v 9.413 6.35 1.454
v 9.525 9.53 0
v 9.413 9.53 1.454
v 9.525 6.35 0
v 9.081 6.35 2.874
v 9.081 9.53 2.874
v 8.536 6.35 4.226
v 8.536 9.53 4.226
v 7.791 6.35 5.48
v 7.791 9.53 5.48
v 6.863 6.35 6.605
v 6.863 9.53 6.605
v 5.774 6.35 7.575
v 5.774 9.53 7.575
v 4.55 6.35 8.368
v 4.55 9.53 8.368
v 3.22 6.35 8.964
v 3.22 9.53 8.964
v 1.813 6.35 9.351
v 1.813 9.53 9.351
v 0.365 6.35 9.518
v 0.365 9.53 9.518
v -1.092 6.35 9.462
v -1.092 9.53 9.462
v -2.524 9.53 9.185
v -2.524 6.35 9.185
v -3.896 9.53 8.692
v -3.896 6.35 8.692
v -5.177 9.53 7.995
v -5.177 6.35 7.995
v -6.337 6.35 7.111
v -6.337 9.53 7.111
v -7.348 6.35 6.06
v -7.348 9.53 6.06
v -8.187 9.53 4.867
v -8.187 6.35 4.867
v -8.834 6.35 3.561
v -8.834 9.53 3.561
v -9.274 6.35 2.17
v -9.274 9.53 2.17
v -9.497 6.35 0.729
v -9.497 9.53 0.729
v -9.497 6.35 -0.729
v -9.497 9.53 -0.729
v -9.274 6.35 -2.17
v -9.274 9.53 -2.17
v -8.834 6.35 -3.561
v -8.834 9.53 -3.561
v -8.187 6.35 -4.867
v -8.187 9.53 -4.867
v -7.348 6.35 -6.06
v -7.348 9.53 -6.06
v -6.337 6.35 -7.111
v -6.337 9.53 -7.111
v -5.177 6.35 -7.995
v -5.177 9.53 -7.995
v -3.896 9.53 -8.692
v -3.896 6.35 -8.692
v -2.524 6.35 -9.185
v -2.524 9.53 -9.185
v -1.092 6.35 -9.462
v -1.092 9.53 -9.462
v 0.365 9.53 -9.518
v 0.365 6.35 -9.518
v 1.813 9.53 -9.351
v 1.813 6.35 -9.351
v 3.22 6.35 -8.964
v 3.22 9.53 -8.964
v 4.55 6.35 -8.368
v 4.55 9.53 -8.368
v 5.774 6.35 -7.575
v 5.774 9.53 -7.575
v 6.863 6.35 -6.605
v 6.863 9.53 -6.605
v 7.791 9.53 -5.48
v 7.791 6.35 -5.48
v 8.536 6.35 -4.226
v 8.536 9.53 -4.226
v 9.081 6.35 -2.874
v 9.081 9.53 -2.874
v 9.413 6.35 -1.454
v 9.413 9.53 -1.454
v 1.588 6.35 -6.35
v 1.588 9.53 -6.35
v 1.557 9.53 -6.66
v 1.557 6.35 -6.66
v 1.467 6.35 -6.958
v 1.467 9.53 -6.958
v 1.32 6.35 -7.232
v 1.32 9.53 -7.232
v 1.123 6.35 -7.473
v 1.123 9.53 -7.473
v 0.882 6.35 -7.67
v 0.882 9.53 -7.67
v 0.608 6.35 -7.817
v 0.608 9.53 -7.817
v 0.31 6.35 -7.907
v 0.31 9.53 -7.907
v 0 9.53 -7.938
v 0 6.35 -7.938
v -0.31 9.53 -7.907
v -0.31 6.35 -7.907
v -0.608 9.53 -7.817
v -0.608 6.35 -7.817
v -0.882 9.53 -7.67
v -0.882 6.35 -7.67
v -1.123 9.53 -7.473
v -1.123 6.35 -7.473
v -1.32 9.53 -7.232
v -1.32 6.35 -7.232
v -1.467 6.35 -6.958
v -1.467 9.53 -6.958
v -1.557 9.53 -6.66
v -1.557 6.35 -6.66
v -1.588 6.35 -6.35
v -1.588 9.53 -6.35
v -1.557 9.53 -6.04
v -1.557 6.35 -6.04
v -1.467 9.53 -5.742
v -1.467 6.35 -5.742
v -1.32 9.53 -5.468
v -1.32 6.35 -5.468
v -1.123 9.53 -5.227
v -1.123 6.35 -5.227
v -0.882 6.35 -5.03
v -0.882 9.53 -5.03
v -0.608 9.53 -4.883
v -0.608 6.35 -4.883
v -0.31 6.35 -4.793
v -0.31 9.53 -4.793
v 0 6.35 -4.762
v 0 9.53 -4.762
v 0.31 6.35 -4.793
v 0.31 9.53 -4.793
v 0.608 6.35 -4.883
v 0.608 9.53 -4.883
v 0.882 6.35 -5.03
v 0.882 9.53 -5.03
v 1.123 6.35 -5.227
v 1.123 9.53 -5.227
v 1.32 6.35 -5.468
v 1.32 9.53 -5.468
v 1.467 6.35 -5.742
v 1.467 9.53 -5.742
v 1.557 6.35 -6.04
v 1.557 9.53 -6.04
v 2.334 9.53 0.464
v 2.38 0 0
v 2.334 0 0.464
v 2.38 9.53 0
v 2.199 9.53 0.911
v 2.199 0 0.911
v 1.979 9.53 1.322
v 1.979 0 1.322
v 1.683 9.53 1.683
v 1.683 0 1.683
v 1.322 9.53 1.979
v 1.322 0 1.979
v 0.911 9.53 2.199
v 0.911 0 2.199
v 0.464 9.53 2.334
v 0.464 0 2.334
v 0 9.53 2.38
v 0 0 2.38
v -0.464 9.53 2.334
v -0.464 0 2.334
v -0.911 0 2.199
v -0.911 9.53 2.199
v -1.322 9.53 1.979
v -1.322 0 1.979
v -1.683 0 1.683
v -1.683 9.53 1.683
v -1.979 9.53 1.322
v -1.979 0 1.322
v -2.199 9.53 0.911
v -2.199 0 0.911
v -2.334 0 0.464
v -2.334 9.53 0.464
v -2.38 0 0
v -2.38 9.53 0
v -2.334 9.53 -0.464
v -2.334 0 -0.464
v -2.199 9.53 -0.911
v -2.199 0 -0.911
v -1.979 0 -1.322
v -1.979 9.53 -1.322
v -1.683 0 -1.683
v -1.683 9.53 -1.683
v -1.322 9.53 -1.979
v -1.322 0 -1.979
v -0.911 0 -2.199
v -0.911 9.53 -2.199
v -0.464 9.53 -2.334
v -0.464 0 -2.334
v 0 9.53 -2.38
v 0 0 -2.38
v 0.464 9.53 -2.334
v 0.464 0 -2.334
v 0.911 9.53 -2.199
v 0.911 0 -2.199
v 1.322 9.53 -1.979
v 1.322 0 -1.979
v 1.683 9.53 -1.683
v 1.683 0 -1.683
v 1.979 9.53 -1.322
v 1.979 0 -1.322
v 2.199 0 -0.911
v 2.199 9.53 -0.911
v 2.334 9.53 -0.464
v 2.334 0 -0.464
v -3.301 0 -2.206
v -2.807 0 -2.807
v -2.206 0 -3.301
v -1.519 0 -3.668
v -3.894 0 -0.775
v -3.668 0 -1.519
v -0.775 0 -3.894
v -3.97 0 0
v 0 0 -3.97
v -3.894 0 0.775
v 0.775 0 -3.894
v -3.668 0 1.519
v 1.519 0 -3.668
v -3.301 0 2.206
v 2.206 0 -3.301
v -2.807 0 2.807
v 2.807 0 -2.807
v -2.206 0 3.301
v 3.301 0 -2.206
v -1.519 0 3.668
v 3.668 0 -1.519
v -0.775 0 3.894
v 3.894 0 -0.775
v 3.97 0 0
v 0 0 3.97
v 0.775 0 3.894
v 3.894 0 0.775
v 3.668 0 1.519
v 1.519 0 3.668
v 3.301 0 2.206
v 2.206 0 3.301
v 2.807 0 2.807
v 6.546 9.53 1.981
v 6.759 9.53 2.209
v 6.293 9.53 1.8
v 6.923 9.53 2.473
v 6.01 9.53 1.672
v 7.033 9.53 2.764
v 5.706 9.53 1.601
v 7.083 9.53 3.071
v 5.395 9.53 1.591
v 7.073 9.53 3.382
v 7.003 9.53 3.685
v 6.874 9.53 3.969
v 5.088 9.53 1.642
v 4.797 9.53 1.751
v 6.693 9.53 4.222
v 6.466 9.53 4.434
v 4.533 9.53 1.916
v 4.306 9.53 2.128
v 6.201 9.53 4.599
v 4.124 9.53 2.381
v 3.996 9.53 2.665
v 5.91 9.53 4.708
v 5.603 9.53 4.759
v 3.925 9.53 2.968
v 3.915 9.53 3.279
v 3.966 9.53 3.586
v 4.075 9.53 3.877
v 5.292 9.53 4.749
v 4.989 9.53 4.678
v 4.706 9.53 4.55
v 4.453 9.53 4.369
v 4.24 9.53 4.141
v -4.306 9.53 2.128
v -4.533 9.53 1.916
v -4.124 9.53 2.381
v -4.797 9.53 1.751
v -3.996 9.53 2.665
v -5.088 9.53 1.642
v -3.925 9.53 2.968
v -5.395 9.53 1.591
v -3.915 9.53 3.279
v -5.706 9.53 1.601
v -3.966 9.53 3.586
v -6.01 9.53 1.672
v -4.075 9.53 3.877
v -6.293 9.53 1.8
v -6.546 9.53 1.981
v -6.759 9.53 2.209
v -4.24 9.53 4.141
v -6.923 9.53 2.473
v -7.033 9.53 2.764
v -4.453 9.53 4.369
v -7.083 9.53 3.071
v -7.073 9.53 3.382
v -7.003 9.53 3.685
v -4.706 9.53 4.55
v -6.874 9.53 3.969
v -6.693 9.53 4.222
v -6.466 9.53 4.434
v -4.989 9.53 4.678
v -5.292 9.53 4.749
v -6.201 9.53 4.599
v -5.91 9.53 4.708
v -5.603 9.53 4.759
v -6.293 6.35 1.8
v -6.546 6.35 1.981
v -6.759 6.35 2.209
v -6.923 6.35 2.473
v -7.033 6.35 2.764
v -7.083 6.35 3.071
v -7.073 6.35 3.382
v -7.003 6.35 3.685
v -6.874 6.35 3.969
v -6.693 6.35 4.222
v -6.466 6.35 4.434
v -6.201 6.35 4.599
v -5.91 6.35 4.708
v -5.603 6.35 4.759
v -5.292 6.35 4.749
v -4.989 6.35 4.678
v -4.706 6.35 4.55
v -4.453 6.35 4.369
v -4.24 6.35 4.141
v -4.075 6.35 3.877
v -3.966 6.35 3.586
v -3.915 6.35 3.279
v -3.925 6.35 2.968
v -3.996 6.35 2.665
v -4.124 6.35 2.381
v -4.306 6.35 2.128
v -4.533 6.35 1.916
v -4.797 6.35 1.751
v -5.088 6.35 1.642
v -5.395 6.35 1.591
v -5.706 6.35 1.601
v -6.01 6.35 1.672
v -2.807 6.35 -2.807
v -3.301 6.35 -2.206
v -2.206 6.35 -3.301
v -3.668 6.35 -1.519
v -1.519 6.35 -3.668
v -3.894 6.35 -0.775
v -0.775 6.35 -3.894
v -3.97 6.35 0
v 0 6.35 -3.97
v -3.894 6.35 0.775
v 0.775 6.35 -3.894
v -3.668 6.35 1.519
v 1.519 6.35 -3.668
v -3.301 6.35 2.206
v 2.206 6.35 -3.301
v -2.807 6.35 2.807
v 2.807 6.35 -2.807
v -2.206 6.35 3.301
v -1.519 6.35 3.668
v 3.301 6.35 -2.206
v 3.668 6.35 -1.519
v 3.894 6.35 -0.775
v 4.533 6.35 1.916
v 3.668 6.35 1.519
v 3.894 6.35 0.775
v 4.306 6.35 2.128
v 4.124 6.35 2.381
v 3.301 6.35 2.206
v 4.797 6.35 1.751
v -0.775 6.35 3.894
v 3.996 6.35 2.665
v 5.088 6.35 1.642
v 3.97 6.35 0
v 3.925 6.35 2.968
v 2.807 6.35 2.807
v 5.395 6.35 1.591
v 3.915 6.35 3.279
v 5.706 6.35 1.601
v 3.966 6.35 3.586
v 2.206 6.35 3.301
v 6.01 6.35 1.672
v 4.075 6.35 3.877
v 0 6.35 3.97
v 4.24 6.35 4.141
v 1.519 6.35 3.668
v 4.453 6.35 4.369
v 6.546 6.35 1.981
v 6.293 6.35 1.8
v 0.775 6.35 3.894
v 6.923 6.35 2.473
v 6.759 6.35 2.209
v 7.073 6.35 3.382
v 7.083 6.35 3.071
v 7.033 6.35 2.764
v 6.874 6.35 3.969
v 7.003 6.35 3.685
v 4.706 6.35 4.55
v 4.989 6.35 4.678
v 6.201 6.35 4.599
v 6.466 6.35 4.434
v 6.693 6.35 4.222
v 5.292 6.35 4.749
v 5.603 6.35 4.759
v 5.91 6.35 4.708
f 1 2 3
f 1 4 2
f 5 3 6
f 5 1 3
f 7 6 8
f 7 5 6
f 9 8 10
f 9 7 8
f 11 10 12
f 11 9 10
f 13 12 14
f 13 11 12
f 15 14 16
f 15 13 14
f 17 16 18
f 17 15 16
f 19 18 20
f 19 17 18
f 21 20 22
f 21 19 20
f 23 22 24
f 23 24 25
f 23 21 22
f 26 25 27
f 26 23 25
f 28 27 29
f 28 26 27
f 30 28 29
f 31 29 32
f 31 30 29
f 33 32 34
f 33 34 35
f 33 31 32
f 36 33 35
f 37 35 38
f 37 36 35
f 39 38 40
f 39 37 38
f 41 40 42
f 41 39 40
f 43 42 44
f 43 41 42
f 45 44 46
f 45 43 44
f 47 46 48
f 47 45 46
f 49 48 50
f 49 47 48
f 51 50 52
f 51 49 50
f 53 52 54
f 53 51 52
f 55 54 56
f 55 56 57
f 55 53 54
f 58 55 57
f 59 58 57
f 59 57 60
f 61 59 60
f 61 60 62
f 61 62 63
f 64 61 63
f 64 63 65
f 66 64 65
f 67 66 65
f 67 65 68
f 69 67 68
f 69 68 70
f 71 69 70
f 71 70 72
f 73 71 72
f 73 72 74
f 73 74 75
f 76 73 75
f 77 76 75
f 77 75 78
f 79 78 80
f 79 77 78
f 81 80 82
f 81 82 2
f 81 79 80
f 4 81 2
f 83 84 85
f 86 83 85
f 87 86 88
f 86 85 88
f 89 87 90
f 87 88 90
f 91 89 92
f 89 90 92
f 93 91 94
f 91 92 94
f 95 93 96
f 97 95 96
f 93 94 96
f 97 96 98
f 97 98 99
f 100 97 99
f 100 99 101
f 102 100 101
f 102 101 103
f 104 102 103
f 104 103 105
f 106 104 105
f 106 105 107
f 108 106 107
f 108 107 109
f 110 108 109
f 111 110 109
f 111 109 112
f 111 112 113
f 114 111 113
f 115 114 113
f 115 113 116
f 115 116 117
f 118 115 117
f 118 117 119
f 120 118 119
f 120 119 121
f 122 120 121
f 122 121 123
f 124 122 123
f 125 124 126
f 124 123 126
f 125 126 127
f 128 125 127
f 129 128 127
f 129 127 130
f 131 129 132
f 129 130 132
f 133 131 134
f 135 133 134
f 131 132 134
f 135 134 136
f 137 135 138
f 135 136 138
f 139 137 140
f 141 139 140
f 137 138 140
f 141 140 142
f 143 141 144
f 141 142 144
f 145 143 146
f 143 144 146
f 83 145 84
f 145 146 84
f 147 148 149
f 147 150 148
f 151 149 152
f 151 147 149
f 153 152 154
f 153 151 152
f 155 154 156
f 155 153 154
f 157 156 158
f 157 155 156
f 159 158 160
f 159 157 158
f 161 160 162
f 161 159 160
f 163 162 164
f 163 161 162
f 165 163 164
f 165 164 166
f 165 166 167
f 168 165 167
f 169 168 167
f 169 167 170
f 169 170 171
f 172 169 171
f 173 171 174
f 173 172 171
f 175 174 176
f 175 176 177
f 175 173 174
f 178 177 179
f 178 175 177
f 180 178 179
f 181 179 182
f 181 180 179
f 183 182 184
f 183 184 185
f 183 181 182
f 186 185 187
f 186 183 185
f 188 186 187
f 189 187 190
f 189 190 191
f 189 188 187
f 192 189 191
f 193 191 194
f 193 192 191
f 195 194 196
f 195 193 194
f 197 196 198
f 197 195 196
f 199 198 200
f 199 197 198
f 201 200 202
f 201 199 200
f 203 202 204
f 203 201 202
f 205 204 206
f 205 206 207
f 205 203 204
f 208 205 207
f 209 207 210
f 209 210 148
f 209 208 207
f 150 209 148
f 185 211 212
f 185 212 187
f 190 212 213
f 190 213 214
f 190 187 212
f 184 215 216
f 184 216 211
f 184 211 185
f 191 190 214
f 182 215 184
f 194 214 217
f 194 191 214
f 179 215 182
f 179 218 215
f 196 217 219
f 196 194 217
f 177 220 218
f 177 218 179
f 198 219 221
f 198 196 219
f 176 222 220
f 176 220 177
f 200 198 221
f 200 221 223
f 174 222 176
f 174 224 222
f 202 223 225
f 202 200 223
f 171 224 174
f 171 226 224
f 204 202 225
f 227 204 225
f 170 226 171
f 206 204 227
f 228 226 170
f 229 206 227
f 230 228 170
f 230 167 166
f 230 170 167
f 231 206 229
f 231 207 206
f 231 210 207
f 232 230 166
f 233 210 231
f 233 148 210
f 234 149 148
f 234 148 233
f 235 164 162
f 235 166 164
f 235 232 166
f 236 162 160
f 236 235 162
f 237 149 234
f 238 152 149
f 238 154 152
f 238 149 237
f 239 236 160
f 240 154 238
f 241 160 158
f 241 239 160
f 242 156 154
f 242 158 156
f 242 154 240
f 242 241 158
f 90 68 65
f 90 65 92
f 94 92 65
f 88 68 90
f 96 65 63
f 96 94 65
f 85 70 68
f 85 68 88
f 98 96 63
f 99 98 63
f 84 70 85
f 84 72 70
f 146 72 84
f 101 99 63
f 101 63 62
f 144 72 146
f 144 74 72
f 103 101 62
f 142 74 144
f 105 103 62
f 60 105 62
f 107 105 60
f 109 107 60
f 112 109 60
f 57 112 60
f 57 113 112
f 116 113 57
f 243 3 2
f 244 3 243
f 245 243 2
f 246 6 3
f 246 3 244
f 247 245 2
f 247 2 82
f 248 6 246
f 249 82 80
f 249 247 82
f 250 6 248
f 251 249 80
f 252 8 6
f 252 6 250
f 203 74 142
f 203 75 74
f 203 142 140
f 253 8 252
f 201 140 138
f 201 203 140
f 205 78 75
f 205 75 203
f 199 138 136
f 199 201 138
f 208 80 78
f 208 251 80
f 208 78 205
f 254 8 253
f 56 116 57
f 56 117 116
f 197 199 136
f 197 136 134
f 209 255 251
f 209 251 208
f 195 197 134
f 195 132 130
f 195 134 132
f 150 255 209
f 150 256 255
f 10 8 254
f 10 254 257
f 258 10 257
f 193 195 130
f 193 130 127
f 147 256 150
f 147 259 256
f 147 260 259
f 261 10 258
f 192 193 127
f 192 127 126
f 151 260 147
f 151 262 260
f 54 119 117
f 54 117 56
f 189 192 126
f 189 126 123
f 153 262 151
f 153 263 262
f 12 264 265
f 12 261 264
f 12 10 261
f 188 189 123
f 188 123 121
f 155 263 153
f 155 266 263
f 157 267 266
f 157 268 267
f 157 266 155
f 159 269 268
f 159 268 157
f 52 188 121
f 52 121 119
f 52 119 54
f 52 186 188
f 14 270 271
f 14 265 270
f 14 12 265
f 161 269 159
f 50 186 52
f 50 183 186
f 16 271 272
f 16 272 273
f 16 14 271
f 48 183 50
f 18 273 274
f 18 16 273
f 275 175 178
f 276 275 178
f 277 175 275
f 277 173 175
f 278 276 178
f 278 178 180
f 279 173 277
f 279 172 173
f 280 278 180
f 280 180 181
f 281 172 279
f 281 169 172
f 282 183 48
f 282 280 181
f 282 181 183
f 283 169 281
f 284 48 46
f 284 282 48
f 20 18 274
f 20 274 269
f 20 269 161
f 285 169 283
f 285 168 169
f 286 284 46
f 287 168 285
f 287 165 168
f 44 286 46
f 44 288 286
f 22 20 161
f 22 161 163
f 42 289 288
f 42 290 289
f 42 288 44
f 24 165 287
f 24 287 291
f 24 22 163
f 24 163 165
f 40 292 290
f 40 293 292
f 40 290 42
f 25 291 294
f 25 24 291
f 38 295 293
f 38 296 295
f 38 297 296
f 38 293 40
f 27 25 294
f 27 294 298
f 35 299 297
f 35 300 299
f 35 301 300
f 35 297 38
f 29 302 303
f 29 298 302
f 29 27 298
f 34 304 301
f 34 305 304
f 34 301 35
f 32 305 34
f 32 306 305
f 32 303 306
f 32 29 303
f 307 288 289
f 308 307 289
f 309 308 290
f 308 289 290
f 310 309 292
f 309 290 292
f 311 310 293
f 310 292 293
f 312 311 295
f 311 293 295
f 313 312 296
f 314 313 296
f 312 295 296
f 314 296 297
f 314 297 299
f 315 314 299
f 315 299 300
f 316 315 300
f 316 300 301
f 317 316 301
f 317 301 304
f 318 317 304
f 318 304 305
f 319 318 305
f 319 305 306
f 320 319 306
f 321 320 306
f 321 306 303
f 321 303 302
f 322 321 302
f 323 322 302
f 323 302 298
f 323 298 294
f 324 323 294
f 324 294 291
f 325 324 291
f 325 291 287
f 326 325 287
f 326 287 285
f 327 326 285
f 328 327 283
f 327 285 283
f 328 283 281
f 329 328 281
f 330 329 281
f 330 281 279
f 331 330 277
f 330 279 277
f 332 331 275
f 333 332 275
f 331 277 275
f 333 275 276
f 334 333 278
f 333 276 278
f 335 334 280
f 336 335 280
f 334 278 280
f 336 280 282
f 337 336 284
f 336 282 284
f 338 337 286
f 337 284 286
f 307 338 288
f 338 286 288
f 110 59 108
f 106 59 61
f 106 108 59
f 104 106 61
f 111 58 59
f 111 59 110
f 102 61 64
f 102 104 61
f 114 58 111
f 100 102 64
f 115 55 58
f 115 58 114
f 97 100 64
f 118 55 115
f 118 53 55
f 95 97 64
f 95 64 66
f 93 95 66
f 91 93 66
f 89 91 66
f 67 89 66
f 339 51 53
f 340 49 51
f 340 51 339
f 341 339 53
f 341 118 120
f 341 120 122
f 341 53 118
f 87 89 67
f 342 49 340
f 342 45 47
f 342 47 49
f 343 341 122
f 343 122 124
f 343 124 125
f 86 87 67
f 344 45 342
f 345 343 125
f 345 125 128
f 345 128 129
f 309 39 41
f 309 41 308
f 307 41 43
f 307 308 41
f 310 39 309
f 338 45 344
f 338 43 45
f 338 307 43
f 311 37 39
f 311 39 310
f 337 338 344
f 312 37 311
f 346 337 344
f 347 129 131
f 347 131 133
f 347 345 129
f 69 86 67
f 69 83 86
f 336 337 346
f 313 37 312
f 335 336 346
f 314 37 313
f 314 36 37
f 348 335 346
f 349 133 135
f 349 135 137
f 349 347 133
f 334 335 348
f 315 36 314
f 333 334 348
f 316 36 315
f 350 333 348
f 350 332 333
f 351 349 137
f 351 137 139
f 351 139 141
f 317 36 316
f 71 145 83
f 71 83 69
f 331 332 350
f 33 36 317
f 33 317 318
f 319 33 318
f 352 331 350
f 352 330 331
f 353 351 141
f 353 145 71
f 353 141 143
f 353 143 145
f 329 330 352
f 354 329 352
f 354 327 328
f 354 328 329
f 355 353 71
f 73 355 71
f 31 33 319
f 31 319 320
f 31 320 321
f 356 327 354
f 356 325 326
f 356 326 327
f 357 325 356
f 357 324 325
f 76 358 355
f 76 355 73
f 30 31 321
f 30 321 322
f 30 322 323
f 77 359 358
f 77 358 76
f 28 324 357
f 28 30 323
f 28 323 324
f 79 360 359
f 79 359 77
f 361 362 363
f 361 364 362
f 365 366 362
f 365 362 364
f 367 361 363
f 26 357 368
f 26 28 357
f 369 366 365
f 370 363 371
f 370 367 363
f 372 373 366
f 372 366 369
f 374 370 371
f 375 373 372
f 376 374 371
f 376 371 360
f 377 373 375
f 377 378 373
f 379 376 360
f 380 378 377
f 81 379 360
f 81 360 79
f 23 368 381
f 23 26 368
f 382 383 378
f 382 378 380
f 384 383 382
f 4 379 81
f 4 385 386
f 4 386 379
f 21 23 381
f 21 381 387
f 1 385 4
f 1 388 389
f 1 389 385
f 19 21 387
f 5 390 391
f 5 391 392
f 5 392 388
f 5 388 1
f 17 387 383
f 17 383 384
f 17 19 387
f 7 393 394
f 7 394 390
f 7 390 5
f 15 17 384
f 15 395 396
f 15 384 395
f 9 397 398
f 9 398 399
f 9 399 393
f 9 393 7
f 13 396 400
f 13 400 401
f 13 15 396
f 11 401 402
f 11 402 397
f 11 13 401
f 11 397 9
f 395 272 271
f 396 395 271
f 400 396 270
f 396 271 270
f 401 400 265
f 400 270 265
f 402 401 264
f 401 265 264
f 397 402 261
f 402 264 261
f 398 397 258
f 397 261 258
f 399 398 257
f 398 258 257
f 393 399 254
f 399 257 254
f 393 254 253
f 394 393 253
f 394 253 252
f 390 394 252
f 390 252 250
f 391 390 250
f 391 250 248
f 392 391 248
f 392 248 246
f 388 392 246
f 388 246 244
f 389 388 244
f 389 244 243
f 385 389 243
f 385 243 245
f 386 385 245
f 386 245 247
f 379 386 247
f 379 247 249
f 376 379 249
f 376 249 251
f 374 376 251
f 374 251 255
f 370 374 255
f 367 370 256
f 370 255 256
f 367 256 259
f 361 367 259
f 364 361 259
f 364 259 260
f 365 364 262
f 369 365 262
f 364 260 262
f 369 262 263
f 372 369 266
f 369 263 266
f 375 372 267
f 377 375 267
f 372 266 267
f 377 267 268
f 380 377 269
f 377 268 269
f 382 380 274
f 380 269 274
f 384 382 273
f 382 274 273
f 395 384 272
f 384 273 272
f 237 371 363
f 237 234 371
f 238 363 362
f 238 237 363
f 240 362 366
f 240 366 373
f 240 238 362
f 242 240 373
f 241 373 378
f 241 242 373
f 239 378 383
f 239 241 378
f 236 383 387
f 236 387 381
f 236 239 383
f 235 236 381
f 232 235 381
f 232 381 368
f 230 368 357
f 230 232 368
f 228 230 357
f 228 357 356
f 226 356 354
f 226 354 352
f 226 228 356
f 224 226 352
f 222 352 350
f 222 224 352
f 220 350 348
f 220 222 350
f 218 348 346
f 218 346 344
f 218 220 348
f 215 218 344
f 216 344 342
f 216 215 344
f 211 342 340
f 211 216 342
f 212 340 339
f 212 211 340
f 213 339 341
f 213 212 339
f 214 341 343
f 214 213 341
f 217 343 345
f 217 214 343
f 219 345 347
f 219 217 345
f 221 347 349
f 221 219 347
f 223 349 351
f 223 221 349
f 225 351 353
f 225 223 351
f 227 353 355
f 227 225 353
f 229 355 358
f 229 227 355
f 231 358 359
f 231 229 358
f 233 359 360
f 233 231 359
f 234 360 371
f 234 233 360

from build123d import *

# Parameters (mm, degrees)
SKETCH2_R          = 1.5875
CUT_EXTRUDE1_DEPTH = 10.53
CIRPATTERN1_COUNT  = 3


with BuildPart() as part:
    # Sketch1 → Revolve1 (revolve)
    with BuildSketch(Plane.XY):
        Polygon((2.38, 9.53), (9.525, 9.53), (9.525, 6.35), (3.97, 6.35), (3.97, 0), (2.38, 0), align=None)
    revolve(axis=Axis((0, 10.340432257, 0), (0, -1, 0)))

    # Sketch2 → Cut-Extrude1 (cut, through all)
    with BuildSketch(Plane(origin=(0, 9.53, 0), x_dir=(1, 0, 0), z_dir=(0, 1, 0))):
        with Locations((0, 6.35)):
            Circle(SKETCH2_R)
    cut_extrude1 = extrude(amount=-CUT_EXTRUDE1_DEPTH, mode=Mode.SUBTRACT)

    # CirPattern1: Cut-Extrude1 ×3 about axis
    cirpattern1_axis = Axis((0, 0, 0), (0, 1, 0))
    for i in range(1, CIRPATTERN1_COUNT):
        add(cut_extrude1.rotate(cirpattern1_axis, i * 360 / CIRPATTERN1_COUNT), mode=Mode.SUBTRACT)


solid = part.part
